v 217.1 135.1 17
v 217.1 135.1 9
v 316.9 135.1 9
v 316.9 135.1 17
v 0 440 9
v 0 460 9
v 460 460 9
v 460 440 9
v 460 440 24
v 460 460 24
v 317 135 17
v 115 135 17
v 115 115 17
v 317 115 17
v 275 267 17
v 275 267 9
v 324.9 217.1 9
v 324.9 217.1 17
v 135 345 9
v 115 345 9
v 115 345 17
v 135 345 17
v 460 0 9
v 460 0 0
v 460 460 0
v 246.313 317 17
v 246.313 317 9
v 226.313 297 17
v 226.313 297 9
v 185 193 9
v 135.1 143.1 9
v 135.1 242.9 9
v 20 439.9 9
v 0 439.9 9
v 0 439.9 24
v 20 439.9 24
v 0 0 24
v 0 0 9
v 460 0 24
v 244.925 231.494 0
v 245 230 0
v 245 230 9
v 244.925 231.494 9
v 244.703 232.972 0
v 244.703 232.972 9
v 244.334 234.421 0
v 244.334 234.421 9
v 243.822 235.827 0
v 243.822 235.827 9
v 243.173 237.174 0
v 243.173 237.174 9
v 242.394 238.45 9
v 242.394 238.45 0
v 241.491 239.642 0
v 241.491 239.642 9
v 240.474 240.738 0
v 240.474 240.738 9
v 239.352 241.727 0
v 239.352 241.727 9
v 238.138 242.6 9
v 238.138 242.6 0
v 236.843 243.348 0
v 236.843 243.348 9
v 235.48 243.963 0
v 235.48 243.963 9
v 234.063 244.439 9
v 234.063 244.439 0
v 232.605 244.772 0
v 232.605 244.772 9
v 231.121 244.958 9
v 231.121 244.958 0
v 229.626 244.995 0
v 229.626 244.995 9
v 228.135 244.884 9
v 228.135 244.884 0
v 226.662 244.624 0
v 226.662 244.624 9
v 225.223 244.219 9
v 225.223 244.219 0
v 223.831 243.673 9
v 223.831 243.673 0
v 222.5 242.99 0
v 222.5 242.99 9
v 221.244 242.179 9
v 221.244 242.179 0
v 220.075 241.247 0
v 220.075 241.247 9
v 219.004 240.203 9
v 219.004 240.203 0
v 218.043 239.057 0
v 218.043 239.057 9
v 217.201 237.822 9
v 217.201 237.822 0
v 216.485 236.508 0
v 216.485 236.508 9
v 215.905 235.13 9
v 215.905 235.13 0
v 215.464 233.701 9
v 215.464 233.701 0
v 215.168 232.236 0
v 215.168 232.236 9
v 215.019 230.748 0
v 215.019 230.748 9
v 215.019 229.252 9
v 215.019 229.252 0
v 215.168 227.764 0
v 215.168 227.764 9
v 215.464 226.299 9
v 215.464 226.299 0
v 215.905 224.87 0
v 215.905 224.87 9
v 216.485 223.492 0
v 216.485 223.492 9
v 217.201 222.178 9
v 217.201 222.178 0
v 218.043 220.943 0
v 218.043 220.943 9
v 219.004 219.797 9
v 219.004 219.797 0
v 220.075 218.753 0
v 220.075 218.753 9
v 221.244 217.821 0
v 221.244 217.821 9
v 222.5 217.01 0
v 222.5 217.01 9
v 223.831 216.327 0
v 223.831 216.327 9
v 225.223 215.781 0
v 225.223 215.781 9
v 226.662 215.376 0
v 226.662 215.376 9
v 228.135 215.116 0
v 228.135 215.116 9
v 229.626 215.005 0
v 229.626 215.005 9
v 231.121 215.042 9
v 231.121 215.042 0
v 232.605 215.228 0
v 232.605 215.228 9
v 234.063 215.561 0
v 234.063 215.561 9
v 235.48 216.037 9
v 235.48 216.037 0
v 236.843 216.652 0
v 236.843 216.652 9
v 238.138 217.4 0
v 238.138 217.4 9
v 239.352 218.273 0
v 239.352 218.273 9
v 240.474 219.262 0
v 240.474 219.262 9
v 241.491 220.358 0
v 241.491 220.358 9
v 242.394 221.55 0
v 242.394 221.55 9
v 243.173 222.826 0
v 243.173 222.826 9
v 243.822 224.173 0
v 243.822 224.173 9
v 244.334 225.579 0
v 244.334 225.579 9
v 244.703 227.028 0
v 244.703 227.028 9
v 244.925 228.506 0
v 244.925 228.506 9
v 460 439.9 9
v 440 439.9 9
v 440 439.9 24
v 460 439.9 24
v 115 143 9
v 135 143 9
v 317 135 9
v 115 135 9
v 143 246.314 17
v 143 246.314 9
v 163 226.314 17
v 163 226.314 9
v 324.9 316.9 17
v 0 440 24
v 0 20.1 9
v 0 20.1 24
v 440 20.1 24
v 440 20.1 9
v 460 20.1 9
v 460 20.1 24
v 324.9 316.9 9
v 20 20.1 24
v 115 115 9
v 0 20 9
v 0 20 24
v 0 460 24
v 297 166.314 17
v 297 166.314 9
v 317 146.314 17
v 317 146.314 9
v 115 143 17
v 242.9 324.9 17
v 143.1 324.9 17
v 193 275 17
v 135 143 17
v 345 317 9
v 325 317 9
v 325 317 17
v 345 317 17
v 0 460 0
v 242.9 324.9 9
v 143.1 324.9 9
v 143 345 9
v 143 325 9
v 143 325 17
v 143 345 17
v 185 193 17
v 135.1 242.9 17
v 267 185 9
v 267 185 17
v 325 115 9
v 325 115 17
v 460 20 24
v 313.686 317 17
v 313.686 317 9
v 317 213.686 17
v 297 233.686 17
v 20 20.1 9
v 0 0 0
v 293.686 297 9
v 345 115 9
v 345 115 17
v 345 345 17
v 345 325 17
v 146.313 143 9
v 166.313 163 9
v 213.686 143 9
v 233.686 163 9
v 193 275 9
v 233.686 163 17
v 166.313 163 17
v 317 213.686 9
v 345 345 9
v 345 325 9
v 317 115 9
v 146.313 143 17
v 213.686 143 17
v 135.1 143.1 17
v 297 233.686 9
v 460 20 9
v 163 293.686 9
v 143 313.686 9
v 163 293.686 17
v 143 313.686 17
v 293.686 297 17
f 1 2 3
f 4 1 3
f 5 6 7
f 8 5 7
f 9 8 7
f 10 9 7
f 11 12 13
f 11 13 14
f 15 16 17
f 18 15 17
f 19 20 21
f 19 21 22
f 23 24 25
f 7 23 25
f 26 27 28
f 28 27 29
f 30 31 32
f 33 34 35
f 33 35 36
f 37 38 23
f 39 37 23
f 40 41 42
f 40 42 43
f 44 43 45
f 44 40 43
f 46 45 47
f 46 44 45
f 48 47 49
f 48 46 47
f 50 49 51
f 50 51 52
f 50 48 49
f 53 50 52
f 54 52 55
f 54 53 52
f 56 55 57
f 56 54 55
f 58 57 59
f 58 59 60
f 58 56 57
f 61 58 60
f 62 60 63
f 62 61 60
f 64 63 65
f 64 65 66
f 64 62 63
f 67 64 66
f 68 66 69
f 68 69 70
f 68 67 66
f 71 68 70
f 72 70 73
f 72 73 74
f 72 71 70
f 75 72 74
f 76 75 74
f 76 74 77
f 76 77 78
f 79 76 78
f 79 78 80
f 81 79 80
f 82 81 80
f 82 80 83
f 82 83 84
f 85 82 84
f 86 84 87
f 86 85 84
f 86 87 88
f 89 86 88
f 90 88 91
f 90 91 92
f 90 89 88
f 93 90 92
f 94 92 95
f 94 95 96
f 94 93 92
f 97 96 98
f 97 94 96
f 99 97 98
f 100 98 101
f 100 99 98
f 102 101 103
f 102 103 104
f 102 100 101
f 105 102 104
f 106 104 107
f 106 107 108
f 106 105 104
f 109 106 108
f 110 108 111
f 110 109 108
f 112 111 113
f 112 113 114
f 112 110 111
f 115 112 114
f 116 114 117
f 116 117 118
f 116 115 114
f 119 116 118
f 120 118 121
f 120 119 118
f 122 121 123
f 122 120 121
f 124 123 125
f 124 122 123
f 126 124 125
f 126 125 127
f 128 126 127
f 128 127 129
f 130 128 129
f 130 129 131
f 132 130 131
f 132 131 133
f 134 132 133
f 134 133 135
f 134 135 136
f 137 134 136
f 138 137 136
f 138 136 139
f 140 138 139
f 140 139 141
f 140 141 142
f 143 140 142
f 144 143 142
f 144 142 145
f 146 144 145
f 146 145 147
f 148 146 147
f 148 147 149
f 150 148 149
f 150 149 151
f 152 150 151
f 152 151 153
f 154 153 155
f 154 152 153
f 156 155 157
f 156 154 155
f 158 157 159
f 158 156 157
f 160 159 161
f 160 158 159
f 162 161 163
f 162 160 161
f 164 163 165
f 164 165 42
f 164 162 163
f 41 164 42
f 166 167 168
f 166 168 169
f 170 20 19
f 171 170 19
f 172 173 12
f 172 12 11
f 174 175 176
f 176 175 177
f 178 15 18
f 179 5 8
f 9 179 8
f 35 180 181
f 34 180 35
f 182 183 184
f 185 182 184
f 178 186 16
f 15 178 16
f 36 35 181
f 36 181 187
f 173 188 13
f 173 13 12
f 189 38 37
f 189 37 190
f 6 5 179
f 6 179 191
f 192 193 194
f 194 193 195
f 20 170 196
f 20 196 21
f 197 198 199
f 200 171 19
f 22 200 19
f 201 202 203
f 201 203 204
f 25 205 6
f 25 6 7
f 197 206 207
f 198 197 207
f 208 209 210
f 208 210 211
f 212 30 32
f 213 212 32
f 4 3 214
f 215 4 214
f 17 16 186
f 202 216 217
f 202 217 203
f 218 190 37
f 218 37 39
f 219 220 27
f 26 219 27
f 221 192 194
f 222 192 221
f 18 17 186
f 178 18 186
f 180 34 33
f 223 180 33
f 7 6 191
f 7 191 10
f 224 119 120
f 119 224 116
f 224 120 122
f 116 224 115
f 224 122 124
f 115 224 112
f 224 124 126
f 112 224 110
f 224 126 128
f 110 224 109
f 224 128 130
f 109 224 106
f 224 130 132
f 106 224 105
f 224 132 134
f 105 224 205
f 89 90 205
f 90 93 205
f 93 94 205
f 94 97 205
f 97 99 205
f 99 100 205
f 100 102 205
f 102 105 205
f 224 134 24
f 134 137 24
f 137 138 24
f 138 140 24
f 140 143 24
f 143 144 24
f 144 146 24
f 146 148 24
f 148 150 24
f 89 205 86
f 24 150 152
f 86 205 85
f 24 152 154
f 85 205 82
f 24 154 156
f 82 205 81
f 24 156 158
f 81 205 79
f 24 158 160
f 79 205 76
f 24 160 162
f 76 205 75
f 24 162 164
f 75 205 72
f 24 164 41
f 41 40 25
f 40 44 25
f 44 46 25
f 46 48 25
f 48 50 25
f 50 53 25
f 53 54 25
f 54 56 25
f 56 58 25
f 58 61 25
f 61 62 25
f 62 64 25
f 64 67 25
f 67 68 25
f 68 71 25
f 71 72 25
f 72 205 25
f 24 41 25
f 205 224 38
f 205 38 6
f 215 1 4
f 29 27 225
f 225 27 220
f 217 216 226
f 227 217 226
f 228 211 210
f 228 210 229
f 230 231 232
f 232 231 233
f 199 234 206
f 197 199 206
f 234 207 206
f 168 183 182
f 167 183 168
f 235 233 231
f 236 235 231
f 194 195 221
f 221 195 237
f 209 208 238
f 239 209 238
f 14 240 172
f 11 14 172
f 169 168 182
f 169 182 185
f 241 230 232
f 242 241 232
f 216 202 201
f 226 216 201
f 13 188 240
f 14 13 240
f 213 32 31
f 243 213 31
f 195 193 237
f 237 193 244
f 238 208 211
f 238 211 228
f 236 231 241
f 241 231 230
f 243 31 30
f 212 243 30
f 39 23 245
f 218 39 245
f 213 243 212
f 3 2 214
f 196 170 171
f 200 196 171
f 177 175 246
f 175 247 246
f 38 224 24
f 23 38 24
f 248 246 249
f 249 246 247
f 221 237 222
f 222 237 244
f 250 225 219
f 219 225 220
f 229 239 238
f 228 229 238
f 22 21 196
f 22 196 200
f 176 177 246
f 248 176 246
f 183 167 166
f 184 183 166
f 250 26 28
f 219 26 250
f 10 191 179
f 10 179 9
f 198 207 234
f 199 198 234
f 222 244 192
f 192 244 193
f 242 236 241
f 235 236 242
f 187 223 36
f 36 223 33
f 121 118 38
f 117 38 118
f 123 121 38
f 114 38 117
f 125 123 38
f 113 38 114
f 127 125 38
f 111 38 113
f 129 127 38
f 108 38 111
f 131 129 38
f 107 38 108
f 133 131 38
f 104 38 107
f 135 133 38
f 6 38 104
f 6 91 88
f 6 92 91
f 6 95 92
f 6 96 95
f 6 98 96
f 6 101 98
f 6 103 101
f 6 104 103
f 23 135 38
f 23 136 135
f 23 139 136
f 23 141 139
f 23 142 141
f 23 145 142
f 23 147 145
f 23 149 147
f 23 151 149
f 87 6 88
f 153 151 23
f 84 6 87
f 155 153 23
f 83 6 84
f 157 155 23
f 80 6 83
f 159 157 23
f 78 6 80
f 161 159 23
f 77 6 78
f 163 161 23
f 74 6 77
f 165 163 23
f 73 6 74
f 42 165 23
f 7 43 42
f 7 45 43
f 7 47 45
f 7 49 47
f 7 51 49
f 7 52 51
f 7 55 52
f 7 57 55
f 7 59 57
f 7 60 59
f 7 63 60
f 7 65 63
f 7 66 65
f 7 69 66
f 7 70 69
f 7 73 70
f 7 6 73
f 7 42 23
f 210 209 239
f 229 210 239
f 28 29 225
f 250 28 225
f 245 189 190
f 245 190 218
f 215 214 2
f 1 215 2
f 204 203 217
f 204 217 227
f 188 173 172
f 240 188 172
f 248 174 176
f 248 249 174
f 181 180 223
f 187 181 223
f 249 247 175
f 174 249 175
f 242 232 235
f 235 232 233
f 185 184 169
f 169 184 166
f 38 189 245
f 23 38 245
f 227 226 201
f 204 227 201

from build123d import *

# Parameters (mm, degrees)
F0_W     = 460
F0_H     = 460
F0_R     = 15
F1_DEPTH = 9
F2_W     = 202
F2_H     = 20
F2_W_2   = 20
F2_H_2   = 202
F3_DEPTH = 8
F4_W     = 460
F4_H     = 20
F4_W_2   = 20
F4_H_2   = 419.8
F5_DEPTH = 15


with BuildPart() as f1:
    # F0 (on Top) → F1 (new body)
    with BuildSketch(Plane.XY):
        with Locations((230, 230)):
            Rectangle(F0_W, F0_H)
        with Locations((230, 230)):
            Circle(F0_R, mode=Mode.SUBTRACT)
    extrude(amount=F1_DEPTH)


with BuildPart() as f3:
    # F2 (on face) → F3 (new body)
    with BuildSketch(Plane.XY.offset(9)):
        with Locations((243.999543, 335.000203)):
            Rectangle(F2_W, F2_H)
        Polygon((242.899543, 324.900203), (143.099543, 324.900203), (192.999543, 275.000203), align=None)
        Polygon((293.685835, 297.000203), (313.685835, 317.000203), (246.313252, 317.000203), (226.313252, 297.000203), align=None)
        Polygon((142.999543, 246.313912), (162.999543, 226.313912), (162.999543, 293.686495), (142.999543, 313.686495), align=None)
        with Locations((124.999543, 244.000203)):
            Rectangle(F2_W_2, F2_H_2)
        Polygon((213.685835, 143.000203), (233.685835, 163.000203), (166.313252, 163.000203), (146.313252, 143.000203), align=None)
        with Locations((215.999543, 125.000203)):
            Rectangle(F2_W, F2_H)
        Polygon((316.999543, 213.686495), (296.999543, 233.686495), (296.999543, 166.313912), (316.999543, 146.313912), align=None)
        with Locations((334.999543, 216.000203)):
            Rectangle(F2_W_2, F2_H_2)
        Polygon((184.999543, 193.000203), (135.099543, 242.900203), (135.099543, 143.100203), align=None)
        Polygon((266.999543, 185.000203), (217.099543, 135.100203), (316.899543, 135.100203), align=None)
        Polygon((274.999543, 267.000203), (324.899543, 217.100203), (324.899543, 316.900203), align=None)
    extrude(amount=F3_DEPTH)


with BuildPart() as f5:
    # F4 (on face) → F5 (new body)
    with BuildSketch(Plane.XY.offset(9)):
        with Locations((230, 450)):
            Rectangle(F4_W, F4_H)
        with Locations((230, 10)):
            Rectangle(F4_W, F4_H)
        with Locations((10, 230)):
            Rectangle(F4_W_2, F4_H_2)
        with Locations((450, 230)):
            Rectangle(F4_W_2, F4_H_2)
    extrude(amount=F5_DEPTH)


solid = Compound([f1.part, f3.part, f5.part])
